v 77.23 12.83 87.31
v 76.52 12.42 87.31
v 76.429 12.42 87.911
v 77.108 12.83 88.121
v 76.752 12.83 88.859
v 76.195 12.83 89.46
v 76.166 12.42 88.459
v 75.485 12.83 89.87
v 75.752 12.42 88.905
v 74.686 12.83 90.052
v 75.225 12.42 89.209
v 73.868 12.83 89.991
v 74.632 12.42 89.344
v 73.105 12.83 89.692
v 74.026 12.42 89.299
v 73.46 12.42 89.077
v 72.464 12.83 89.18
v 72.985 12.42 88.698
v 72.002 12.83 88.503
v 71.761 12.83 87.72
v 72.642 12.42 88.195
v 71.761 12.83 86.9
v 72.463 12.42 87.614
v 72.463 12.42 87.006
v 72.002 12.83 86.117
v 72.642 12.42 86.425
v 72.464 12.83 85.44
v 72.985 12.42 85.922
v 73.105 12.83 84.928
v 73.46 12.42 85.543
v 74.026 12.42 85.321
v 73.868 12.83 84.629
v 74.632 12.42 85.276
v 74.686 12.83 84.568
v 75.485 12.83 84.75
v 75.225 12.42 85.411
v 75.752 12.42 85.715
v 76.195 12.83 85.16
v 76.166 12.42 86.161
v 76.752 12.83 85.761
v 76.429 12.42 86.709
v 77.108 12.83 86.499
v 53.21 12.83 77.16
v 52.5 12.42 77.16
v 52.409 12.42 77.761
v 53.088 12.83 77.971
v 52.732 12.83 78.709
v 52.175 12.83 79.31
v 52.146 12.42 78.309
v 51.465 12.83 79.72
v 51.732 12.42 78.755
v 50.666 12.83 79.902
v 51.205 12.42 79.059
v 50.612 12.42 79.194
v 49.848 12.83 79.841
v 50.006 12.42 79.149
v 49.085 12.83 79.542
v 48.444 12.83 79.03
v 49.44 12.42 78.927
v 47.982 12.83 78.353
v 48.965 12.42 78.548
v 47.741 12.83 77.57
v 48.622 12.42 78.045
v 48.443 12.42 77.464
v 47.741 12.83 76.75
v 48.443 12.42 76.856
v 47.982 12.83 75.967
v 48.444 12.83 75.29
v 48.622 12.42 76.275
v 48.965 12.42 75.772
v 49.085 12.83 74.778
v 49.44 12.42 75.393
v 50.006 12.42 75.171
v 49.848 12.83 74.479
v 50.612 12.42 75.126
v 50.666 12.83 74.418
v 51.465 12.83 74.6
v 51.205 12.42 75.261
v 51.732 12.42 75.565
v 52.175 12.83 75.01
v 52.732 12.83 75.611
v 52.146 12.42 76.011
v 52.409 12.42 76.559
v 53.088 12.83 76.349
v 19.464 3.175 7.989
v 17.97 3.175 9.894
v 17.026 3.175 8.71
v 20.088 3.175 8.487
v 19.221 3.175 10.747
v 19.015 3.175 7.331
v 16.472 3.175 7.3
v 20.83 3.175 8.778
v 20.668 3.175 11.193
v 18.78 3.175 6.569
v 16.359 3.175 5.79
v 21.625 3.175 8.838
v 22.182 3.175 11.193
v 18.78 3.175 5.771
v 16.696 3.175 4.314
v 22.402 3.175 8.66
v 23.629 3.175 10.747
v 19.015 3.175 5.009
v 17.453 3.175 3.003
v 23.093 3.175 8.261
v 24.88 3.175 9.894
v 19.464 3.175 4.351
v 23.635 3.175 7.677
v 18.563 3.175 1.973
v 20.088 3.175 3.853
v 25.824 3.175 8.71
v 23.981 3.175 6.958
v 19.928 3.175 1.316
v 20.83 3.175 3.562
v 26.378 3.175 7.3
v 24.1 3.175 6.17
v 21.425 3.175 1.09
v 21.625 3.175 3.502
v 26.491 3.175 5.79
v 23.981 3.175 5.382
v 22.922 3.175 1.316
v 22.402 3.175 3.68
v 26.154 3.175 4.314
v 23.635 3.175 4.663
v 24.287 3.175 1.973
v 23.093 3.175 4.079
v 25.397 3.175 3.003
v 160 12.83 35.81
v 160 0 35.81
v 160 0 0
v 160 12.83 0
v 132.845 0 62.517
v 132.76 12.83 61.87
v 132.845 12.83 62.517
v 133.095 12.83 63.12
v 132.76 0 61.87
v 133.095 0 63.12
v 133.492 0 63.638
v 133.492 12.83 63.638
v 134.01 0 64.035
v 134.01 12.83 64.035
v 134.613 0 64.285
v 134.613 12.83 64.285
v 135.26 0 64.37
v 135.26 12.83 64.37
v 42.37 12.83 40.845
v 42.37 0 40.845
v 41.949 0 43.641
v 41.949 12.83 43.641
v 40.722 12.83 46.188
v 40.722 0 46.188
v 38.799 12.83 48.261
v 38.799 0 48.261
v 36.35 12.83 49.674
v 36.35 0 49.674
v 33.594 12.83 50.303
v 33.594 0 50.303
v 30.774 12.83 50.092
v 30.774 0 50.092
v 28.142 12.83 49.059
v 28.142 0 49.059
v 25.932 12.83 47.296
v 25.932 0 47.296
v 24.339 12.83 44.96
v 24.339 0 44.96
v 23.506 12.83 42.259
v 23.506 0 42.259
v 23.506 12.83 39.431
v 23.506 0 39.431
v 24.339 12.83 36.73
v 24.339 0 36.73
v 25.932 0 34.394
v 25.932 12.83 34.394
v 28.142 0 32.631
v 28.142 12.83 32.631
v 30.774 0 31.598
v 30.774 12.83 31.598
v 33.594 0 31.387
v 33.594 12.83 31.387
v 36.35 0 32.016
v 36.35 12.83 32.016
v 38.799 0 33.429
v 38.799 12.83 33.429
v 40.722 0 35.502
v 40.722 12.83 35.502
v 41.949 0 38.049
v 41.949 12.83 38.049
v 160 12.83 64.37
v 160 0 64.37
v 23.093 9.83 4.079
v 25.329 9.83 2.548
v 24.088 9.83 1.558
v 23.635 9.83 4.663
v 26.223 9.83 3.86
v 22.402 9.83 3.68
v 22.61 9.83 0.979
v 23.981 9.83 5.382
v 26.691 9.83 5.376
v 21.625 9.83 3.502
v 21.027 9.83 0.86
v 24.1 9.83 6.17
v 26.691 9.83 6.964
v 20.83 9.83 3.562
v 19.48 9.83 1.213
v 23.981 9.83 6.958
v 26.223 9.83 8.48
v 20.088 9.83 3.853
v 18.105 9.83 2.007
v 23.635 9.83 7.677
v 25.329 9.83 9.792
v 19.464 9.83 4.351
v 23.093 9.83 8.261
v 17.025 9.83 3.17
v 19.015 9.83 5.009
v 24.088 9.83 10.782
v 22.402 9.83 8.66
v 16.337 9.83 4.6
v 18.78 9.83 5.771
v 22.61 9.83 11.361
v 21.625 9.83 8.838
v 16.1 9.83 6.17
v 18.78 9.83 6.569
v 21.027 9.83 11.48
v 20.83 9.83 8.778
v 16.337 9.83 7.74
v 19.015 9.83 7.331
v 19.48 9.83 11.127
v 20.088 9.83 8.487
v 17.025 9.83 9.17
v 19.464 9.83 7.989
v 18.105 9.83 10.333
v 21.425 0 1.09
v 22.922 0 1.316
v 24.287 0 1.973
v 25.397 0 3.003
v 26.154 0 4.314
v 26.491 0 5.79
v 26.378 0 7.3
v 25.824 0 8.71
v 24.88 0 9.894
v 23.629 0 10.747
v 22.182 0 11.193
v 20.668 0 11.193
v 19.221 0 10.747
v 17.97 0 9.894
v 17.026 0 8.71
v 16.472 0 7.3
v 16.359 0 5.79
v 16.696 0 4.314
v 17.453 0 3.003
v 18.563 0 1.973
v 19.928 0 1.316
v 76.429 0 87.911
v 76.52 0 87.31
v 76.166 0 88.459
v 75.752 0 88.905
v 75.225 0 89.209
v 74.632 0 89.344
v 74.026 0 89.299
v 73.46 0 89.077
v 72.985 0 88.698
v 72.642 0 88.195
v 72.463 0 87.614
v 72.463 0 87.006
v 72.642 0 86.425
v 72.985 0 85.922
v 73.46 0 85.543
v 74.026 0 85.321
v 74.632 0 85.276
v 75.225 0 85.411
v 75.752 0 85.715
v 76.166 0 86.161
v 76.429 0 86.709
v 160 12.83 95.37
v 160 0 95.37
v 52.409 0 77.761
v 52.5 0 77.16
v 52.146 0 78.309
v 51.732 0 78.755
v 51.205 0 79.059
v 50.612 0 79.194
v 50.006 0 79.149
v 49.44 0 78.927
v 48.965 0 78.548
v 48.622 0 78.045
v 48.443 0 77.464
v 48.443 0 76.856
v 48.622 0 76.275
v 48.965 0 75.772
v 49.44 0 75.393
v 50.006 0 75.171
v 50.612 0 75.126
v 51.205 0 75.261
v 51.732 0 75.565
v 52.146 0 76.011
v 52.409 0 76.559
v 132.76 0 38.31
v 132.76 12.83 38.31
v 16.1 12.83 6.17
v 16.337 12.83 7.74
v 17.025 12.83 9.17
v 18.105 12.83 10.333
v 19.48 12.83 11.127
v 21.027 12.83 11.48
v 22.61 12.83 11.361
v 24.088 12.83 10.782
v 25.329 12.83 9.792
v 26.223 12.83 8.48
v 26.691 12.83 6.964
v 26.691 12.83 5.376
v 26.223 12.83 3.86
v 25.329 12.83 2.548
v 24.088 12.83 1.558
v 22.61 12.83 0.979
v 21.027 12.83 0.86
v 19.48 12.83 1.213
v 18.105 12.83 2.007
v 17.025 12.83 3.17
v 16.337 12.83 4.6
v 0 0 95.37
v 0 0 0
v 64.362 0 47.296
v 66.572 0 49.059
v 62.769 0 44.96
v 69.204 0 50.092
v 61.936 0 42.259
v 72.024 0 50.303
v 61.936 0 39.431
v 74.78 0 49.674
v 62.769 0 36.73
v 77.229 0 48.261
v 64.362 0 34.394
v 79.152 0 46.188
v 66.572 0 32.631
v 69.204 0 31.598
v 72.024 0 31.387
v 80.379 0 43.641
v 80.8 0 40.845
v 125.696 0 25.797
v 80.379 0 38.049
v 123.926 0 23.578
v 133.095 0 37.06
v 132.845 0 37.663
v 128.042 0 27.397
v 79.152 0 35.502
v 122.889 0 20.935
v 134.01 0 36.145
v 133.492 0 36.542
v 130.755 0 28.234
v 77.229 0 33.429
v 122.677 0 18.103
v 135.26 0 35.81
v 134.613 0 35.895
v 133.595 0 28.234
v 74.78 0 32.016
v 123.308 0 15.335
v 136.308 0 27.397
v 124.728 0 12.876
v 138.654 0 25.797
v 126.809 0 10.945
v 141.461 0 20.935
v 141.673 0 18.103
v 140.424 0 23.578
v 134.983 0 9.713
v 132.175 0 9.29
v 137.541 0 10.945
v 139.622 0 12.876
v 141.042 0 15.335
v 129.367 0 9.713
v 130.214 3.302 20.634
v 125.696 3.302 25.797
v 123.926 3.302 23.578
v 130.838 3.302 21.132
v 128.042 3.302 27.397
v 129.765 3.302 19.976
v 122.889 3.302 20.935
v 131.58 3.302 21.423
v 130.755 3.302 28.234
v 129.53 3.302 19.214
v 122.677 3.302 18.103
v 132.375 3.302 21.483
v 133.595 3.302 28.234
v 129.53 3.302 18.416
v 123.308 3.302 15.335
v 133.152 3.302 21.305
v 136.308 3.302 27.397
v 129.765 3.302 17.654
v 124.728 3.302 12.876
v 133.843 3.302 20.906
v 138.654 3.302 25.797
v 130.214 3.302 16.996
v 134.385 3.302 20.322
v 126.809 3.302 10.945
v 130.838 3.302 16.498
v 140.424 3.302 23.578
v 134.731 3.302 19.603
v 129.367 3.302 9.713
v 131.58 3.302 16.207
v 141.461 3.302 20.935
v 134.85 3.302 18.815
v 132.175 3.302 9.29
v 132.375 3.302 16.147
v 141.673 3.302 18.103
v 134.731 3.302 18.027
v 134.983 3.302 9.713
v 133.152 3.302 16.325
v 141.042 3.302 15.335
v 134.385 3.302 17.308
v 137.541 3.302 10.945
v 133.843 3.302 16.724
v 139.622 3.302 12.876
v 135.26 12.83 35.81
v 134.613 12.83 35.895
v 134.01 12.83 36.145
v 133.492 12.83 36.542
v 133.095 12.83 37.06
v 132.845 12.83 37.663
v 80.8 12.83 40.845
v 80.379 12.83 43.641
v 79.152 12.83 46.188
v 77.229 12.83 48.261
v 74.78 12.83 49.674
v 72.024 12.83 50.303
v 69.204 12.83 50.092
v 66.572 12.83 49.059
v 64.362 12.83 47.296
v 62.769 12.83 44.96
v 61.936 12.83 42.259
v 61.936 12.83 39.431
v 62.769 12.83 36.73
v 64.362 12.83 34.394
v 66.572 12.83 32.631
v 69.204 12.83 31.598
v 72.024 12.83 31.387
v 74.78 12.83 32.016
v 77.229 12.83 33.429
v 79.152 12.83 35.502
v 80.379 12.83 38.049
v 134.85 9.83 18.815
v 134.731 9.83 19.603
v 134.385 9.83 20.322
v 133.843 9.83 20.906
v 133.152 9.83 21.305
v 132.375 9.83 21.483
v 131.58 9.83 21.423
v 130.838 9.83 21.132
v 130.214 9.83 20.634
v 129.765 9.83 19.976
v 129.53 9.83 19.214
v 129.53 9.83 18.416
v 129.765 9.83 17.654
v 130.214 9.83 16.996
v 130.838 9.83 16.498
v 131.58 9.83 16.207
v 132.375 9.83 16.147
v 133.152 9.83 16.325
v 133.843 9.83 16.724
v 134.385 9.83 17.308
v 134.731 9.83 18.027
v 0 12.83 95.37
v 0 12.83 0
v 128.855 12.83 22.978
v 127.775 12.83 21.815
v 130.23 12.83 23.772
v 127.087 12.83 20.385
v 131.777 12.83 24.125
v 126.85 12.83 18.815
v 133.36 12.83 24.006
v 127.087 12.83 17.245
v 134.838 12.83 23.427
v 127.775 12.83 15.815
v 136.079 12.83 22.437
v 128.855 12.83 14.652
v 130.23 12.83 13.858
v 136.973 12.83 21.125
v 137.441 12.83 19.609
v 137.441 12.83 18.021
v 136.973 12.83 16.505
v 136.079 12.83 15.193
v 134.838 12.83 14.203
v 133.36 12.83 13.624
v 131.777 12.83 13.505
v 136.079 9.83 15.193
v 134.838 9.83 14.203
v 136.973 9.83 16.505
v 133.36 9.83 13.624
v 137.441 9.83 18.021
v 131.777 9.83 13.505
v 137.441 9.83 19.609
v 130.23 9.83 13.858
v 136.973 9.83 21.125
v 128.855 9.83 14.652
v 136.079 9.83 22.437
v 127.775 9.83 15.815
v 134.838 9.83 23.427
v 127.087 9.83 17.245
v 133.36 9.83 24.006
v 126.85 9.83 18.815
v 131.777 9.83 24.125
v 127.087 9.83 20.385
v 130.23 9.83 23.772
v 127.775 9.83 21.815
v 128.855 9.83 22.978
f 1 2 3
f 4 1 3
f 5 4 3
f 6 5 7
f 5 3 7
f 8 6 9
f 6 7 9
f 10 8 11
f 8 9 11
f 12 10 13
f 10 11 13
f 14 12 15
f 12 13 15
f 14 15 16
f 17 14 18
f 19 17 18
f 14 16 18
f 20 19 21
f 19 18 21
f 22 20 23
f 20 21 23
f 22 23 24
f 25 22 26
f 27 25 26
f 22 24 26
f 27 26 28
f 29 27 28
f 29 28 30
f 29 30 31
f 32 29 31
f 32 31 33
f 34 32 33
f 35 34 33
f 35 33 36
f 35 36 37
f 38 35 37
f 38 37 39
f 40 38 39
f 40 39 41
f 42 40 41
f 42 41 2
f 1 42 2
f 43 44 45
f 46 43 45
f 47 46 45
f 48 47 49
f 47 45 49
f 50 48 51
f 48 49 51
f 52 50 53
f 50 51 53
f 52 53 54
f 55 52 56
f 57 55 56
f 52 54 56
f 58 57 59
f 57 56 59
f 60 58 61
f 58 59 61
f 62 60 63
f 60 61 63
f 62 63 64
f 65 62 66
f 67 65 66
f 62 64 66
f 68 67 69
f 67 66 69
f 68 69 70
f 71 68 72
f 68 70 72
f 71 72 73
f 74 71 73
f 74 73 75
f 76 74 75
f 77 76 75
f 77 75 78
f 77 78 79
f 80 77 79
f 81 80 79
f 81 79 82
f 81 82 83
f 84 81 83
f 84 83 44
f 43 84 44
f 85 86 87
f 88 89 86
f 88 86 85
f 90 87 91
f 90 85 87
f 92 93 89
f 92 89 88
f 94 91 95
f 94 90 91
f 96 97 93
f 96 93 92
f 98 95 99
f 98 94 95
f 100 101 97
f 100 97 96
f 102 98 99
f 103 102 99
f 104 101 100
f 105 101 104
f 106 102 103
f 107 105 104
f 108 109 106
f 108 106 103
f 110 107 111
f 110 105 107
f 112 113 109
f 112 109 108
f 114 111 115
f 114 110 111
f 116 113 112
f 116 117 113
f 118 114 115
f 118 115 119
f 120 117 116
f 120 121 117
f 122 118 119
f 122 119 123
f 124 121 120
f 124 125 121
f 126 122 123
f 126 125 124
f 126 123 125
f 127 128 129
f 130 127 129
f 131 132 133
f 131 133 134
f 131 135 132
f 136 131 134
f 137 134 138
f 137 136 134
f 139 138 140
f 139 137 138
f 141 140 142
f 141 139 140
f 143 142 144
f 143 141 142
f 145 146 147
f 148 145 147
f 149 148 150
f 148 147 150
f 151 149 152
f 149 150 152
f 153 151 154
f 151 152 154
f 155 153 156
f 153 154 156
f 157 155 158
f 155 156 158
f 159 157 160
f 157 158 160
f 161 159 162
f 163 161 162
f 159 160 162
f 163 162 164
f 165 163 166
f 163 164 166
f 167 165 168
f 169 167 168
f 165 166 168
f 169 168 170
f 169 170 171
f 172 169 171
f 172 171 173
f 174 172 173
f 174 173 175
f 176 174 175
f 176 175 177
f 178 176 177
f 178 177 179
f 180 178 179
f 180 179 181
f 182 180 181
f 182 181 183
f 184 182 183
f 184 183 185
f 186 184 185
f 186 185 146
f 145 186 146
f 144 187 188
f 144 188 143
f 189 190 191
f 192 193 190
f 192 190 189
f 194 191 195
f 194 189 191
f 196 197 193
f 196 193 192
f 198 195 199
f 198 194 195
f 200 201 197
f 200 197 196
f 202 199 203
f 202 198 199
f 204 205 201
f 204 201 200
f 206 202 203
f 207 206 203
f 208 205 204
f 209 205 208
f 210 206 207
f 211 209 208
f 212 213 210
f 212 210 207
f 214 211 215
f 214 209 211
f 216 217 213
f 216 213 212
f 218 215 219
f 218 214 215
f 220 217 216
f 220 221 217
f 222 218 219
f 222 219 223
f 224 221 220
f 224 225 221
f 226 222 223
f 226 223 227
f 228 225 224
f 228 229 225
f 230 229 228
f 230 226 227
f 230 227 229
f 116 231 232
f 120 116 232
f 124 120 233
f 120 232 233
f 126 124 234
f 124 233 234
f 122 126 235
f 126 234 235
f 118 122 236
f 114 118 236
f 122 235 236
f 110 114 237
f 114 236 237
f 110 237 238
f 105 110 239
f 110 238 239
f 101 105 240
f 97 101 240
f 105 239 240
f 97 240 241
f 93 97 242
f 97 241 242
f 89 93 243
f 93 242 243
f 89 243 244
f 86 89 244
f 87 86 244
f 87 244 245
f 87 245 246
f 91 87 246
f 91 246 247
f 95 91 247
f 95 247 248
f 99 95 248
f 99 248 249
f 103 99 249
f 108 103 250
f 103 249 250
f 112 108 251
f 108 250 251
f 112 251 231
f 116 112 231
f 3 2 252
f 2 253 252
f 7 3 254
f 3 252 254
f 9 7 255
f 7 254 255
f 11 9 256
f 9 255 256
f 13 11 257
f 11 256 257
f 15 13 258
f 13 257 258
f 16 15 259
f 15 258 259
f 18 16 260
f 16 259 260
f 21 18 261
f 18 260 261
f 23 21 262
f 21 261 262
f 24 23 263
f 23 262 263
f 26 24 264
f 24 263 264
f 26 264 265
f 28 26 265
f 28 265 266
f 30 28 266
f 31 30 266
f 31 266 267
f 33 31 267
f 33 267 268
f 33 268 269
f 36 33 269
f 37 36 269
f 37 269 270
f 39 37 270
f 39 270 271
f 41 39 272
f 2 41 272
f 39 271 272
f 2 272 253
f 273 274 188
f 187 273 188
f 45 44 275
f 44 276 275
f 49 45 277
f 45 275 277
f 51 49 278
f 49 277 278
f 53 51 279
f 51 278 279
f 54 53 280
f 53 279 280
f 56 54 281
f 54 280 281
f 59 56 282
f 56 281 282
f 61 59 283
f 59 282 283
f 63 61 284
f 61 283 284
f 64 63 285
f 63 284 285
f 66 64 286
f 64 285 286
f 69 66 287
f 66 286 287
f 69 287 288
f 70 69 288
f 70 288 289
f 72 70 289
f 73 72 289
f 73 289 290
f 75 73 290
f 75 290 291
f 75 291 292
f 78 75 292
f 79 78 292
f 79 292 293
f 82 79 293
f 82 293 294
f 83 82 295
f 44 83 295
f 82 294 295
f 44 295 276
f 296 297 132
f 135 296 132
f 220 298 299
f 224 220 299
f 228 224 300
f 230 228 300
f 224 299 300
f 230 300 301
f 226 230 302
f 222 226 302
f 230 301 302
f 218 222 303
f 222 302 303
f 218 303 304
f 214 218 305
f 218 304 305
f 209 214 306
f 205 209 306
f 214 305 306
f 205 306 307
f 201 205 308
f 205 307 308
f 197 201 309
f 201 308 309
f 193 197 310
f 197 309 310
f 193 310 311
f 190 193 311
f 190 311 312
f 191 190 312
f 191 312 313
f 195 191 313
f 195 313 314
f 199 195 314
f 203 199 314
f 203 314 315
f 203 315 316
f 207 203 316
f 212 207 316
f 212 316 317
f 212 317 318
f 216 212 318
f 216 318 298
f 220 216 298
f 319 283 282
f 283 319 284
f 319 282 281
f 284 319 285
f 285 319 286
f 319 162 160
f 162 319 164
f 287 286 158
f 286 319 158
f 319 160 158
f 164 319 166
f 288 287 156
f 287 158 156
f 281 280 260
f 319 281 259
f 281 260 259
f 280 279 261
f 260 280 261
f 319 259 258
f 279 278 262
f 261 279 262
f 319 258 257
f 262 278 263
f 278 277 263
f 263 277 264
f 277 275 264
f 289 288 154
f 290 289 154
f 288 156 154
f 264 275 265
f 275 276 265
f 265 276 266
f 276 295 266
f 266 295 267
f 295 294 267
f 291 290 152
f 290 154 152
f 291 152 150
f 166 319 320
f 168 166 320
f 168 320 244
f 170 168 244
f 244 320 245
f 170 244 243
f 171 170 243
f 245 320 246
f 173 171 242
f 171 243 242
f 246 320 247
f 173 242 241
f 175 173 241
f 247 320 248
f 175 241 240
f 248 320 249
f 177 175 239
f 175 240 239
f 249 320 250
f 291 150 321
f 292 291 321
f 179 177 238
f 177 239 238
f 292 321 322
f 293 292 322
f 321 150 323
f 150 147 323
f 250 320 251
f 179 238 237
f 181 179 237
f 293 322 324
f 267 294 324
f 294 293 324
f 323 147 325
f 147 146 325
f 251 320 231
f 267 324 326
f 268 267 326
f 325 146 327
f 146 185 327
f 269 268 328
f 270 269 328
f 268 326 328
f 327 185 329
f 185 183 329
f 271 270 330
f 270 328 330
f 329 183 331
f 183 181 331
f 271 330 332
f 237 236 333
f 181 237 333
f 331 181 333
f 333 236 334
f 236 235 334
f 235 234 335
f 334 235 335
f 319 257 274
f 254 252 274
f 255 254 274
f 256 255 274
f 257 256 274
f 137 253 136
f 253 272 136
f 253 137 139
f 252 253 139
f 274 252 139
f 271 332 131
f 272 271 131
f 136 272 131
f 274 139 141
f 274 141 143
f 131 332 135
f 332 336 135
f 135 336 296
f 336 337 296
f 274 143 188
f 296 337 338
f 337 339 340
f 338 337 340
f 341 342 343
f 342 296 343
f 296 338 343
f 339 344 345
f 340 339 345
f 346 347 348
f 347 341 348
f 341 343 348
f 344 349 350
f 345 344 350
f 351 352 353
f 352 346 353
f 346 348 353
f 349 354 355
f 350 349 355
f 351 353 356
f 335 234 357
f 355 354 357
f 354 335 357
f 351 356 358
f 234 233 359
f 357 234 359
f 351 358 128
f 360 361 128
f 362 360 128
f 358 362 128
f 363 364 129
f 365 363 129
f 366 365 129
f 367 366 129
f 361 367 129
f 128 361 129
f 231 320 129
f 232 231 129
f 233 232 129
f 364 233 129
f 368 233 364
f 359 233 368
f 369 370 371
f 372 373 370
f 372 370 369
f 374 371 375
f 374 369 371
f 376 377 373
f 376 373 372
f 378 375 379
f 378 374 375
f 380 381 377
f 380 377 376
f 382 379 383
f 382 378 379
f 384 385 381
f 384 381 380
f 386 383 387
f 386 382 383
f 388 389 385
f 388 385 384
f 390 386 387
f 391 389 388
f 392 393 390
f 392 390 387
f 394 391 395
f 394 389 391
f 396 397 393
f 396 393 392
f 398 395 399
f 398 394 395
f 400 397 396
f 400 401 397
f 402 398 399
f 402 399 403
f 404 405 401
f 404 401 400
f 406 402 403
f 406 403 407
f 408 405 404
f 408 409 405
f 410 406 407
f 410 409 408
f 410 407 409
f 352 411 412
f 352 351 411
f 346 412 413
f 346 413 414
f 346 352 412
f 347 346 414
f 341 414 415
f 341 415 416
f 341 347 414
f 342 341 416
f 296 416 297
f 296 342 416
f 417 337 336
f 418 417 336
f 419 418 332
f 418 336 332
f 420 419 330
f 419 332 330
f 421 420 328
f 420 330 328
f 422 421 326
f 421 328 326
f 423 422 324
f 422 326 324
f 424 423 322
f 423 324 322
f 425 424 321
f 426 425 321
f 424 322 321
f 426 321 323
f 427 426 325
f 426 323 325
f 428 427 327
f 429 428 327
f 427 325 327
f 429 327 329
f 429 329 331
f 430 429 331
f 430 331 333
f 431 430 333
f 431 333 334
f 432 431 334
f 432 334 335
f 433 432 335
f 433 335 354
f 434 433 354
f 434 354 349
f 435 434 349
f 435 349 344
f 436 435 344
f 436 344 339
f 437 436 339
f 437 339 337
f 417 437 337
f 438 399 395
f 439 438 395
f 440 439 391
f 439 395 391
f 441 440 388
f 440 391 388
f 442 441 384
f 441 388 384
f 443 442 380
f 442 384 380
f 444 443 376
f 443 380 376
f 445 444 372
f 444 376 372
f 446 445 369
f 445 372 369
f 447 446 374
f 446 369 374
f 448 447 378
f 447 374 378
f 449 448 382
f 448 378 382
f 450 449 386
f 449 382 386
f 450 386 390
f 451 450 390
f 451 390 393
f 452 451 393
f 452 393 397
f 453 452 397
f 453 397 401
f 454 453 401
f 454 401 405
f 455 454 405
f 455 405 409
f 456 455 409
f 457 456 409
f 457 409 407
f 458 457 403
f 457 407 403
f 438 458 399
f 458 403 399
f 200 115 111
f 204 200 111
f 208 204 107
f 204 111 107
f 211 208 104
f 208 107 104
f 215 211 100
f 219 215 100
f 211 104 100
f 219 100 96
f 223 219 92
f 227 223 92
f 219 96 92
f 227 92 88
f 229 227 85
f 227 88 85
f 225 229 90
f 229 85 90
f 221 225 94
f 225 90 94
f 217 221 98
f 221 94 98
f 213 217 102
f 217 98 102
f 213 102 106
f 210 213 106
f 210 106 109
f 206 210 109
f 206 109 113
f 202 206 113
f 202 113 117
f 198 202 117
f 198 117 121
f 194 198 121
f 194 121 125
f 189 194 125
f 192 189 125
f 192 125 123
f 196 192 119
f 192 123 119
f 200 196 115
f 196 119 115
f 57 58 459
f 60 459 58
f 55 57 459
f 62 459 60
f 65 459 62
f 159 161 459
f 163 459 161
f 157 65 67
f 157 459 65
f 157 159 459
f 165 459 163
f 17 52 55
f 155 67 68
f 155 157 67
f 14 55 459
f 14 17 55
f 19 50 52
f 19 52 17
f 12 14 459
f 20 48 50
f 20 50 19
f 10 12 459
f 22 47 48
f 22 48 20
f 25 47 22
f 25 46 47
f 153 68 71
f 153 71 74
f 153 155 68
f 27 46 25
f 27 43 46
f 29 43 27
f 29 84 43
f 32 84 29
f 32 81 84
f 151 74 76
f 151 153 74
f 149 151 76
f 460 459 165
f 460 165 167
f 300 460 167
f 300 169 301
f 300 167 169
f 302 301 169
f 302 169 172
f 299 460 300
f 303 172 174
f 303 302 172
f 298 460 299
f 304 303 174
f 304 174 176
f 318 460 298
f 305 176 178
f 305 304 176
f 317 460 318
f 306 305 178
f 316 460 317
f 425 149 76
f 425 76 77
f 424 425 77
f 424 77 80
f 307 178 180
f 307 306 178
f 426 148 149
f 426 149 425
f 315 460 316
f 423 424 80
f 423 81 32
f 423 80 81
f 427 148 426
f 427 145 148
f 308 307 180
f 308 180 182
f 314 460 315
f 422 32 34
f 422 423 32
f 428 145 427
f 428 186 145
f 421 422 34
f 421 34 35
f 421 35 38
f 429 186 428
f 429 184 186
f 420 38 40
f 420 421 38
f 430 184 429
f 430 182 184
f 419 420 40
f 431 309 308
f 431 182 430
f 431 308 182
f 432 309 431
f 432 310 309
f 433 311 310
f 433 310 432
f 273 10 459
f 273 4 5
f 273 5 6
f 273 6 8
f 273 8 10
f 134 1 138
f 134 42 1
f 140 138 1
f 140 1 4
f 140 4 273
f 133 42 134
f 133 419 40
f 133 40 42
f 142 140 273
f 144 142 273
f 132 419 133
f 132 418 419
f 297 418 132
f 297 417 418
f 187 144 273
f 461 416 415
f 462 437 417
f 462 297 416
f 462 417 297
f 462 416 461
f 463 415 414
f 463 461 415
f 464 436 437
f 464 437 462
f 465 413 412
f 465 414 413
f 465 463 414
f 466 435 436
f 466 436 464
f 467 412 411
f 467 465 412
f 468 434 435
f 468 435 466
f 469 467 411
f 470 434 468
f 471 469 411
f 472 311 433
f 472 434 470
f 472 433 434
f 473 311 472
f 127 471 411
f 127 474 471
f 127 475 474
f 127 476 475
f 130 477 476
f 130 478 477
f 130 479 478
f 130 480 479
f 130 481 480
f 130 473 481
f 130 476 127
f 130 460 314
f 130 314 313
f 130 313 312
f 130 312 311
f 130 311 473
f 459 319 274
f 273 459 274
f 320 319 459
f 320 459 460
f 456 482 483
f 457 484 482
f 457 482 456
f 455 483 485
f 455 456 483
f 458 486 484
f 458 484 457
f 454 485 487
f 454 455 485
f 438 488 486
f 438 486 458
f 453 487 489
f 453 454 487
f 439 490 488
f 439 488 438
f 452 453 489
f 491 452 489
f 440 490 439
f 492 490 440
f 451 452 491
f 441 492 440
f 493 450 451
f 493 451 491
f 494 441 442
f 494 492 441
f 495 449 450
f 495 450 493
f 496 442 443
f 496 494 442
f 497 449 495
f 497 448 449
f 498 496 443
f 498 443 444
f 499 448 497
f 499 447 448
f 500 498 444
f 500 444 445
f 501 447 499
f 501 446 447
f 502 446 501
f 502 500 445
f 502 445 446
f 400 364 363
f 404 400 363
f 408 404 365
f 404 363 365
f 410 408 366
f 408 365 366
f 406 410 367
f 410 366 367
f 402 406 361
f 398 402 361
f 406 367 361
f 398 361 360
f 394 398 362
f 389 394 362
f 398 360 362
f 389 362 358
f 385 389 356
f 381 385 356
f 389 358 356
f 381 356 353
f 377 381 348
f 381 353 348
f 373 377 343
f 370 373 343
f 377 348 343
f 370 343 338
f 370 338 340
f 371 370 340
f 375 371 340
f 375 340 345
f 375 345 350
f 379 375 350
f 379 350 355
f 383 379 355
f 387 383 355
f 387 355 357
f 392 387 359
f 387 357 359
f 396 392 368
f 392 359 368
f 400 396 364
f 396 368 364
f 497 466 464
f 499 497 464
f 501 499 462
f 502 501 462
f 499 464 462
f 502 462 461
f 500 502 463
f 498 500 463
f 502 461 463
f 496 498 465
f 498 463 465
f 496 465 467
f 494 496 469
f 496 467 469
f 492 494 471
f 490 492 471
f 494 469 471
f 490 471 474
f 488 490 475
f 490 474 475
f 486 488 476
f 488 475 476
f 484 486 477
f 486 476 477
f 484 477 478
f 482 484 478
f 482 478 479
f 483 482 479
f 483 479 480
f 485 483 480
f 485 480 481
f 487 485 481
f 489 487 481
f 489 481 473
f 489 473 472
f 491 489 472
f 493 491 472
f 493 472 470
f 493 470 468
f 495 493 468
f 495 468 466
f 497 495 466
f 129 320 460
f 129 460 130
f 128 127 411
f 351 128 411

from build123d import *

# Parameters (mm, degrees)
SKETCH1_W           = 160
SKETCH1_H           = 95.37
BOSS_EXTRUDE3_DEPTH = 12.83
HOLE1_D             = 18.97
SKETCH4_W           = 27.24
SKETCH4_H           = 28.56
CUT_EXTRUDE1_DEPTH  = 187.708451335
FILLET1_R           = 2.5
HOLE2_D             = 5.35
HOLE2_CBORE_D       = 10.65
HOLE2_CBORE_DEPTH   = 3
HOLE3_D             = 4.08
HOLE3_CSINK_D       = 5.5
HOLE3_CSINK_ANGLE   = 120
SKETCH10_R          = 9.525
CUT_EXTRUDE2_DEPTH  = 3.301941
SKETCH11_R          = 5.08
CUT_EXTRUDE3_DEPTH  = 3.175


with BuildPart() as part:
    # Sketch1 → Boss-Extrude3 (new body)
    with BuildSketch(Plane(origin=(0, 0, 0), x_dir=(1, 0, 0), z_dir=(0, 1, 0))):
        with Locations((80, -47.685)):
            Rectangle(SKETCH1_W, SKETCH1_H)
    extrude(amount=BOSS_EXTRUDE3_DEPTH)

    # Hole1 (through all)
    with Locations(Plane(origin=(0, 12.83, 0), x_dir=(-1, 0, 0), z_dir=(0, 1, 0))):
        with Locations((-32.885, 40.845), (-71.315, 40.845)):
            Hole(HOLE1_D / 2)

    # Sketch4 → Cut-Extrude1 (cut, through all)
    with BuildSketch(Plane(origin=(0, 12.83, 0), x_dir=(-1, 0, 0), z_dir=(0, 1, 0))):
        with Locations((-146.38, 50.09)):
            Rectangle(SKETCH4_W, SKETCH4_H)
    extrude(amount=-CUT_EXTRUDE1_DEPTH, mode=Mode.SUBTRACT)

    # Fillet1
    fillet1_edges = [part.edges().sort_by_distance(p)[0] for p in [
        (132.76, 6.415, 64.37),
        (132.76, 6.415, 35.81),
    ]]
    fillet(fillet1_edges, radius=FILLET1_R)

    # Hole2 (through all)
    with Locations(Plane(origin=(0, 12.83, 0), x_dir=(-1, 0, 0), z_dir=(0, 1, 0))):
        with Locations((-21.425, 6.17), (-132.175, 18.815)):
            CounterBoreHole(HOLE2_D / 2, HOLE2_CBORE_D / 2, HOLE2_CBORE_DEPTH)

    # Hole3 (through all)
    with Locations(Plane(origin=(0, 12.83, 0), x_dir=(-1, 0, 0), z_dir=(0, 1, 0))):
        with Locations((-50.46, 77.16), (-74.48, 87.31)):
            CounterSinkHole(HOLE3_D / 2, HOLE3_CSINK_D / 2, counter_sink_angle=HOLE3_CSINK_ANGLE)

    # Sketch10 → Cut-Extrude2 (cut)
    with BuildSketch(Plane.XZ):
        with Locations(Location((132.175, 18.815, 0), (0, 0, 270))):
            Circle(SKETCH10_R)
    extrude(amount=-CUT_EXTRUDE2_DEPTH, mode=Mode.SUBTRACT)

    # Sketch11 → Cut-Extrude3 (cut)
    with BuildSketch(Plane.XZ):
        with Locations(Location((21.425, 6.17, 0), (0, 0, 270))):
            Circle(SKETCH11_R)
    extrude(amount=-CUT_EXTRUDE3_DEPTH, mode=Mode.SUBTRACT)


solid = part.part
